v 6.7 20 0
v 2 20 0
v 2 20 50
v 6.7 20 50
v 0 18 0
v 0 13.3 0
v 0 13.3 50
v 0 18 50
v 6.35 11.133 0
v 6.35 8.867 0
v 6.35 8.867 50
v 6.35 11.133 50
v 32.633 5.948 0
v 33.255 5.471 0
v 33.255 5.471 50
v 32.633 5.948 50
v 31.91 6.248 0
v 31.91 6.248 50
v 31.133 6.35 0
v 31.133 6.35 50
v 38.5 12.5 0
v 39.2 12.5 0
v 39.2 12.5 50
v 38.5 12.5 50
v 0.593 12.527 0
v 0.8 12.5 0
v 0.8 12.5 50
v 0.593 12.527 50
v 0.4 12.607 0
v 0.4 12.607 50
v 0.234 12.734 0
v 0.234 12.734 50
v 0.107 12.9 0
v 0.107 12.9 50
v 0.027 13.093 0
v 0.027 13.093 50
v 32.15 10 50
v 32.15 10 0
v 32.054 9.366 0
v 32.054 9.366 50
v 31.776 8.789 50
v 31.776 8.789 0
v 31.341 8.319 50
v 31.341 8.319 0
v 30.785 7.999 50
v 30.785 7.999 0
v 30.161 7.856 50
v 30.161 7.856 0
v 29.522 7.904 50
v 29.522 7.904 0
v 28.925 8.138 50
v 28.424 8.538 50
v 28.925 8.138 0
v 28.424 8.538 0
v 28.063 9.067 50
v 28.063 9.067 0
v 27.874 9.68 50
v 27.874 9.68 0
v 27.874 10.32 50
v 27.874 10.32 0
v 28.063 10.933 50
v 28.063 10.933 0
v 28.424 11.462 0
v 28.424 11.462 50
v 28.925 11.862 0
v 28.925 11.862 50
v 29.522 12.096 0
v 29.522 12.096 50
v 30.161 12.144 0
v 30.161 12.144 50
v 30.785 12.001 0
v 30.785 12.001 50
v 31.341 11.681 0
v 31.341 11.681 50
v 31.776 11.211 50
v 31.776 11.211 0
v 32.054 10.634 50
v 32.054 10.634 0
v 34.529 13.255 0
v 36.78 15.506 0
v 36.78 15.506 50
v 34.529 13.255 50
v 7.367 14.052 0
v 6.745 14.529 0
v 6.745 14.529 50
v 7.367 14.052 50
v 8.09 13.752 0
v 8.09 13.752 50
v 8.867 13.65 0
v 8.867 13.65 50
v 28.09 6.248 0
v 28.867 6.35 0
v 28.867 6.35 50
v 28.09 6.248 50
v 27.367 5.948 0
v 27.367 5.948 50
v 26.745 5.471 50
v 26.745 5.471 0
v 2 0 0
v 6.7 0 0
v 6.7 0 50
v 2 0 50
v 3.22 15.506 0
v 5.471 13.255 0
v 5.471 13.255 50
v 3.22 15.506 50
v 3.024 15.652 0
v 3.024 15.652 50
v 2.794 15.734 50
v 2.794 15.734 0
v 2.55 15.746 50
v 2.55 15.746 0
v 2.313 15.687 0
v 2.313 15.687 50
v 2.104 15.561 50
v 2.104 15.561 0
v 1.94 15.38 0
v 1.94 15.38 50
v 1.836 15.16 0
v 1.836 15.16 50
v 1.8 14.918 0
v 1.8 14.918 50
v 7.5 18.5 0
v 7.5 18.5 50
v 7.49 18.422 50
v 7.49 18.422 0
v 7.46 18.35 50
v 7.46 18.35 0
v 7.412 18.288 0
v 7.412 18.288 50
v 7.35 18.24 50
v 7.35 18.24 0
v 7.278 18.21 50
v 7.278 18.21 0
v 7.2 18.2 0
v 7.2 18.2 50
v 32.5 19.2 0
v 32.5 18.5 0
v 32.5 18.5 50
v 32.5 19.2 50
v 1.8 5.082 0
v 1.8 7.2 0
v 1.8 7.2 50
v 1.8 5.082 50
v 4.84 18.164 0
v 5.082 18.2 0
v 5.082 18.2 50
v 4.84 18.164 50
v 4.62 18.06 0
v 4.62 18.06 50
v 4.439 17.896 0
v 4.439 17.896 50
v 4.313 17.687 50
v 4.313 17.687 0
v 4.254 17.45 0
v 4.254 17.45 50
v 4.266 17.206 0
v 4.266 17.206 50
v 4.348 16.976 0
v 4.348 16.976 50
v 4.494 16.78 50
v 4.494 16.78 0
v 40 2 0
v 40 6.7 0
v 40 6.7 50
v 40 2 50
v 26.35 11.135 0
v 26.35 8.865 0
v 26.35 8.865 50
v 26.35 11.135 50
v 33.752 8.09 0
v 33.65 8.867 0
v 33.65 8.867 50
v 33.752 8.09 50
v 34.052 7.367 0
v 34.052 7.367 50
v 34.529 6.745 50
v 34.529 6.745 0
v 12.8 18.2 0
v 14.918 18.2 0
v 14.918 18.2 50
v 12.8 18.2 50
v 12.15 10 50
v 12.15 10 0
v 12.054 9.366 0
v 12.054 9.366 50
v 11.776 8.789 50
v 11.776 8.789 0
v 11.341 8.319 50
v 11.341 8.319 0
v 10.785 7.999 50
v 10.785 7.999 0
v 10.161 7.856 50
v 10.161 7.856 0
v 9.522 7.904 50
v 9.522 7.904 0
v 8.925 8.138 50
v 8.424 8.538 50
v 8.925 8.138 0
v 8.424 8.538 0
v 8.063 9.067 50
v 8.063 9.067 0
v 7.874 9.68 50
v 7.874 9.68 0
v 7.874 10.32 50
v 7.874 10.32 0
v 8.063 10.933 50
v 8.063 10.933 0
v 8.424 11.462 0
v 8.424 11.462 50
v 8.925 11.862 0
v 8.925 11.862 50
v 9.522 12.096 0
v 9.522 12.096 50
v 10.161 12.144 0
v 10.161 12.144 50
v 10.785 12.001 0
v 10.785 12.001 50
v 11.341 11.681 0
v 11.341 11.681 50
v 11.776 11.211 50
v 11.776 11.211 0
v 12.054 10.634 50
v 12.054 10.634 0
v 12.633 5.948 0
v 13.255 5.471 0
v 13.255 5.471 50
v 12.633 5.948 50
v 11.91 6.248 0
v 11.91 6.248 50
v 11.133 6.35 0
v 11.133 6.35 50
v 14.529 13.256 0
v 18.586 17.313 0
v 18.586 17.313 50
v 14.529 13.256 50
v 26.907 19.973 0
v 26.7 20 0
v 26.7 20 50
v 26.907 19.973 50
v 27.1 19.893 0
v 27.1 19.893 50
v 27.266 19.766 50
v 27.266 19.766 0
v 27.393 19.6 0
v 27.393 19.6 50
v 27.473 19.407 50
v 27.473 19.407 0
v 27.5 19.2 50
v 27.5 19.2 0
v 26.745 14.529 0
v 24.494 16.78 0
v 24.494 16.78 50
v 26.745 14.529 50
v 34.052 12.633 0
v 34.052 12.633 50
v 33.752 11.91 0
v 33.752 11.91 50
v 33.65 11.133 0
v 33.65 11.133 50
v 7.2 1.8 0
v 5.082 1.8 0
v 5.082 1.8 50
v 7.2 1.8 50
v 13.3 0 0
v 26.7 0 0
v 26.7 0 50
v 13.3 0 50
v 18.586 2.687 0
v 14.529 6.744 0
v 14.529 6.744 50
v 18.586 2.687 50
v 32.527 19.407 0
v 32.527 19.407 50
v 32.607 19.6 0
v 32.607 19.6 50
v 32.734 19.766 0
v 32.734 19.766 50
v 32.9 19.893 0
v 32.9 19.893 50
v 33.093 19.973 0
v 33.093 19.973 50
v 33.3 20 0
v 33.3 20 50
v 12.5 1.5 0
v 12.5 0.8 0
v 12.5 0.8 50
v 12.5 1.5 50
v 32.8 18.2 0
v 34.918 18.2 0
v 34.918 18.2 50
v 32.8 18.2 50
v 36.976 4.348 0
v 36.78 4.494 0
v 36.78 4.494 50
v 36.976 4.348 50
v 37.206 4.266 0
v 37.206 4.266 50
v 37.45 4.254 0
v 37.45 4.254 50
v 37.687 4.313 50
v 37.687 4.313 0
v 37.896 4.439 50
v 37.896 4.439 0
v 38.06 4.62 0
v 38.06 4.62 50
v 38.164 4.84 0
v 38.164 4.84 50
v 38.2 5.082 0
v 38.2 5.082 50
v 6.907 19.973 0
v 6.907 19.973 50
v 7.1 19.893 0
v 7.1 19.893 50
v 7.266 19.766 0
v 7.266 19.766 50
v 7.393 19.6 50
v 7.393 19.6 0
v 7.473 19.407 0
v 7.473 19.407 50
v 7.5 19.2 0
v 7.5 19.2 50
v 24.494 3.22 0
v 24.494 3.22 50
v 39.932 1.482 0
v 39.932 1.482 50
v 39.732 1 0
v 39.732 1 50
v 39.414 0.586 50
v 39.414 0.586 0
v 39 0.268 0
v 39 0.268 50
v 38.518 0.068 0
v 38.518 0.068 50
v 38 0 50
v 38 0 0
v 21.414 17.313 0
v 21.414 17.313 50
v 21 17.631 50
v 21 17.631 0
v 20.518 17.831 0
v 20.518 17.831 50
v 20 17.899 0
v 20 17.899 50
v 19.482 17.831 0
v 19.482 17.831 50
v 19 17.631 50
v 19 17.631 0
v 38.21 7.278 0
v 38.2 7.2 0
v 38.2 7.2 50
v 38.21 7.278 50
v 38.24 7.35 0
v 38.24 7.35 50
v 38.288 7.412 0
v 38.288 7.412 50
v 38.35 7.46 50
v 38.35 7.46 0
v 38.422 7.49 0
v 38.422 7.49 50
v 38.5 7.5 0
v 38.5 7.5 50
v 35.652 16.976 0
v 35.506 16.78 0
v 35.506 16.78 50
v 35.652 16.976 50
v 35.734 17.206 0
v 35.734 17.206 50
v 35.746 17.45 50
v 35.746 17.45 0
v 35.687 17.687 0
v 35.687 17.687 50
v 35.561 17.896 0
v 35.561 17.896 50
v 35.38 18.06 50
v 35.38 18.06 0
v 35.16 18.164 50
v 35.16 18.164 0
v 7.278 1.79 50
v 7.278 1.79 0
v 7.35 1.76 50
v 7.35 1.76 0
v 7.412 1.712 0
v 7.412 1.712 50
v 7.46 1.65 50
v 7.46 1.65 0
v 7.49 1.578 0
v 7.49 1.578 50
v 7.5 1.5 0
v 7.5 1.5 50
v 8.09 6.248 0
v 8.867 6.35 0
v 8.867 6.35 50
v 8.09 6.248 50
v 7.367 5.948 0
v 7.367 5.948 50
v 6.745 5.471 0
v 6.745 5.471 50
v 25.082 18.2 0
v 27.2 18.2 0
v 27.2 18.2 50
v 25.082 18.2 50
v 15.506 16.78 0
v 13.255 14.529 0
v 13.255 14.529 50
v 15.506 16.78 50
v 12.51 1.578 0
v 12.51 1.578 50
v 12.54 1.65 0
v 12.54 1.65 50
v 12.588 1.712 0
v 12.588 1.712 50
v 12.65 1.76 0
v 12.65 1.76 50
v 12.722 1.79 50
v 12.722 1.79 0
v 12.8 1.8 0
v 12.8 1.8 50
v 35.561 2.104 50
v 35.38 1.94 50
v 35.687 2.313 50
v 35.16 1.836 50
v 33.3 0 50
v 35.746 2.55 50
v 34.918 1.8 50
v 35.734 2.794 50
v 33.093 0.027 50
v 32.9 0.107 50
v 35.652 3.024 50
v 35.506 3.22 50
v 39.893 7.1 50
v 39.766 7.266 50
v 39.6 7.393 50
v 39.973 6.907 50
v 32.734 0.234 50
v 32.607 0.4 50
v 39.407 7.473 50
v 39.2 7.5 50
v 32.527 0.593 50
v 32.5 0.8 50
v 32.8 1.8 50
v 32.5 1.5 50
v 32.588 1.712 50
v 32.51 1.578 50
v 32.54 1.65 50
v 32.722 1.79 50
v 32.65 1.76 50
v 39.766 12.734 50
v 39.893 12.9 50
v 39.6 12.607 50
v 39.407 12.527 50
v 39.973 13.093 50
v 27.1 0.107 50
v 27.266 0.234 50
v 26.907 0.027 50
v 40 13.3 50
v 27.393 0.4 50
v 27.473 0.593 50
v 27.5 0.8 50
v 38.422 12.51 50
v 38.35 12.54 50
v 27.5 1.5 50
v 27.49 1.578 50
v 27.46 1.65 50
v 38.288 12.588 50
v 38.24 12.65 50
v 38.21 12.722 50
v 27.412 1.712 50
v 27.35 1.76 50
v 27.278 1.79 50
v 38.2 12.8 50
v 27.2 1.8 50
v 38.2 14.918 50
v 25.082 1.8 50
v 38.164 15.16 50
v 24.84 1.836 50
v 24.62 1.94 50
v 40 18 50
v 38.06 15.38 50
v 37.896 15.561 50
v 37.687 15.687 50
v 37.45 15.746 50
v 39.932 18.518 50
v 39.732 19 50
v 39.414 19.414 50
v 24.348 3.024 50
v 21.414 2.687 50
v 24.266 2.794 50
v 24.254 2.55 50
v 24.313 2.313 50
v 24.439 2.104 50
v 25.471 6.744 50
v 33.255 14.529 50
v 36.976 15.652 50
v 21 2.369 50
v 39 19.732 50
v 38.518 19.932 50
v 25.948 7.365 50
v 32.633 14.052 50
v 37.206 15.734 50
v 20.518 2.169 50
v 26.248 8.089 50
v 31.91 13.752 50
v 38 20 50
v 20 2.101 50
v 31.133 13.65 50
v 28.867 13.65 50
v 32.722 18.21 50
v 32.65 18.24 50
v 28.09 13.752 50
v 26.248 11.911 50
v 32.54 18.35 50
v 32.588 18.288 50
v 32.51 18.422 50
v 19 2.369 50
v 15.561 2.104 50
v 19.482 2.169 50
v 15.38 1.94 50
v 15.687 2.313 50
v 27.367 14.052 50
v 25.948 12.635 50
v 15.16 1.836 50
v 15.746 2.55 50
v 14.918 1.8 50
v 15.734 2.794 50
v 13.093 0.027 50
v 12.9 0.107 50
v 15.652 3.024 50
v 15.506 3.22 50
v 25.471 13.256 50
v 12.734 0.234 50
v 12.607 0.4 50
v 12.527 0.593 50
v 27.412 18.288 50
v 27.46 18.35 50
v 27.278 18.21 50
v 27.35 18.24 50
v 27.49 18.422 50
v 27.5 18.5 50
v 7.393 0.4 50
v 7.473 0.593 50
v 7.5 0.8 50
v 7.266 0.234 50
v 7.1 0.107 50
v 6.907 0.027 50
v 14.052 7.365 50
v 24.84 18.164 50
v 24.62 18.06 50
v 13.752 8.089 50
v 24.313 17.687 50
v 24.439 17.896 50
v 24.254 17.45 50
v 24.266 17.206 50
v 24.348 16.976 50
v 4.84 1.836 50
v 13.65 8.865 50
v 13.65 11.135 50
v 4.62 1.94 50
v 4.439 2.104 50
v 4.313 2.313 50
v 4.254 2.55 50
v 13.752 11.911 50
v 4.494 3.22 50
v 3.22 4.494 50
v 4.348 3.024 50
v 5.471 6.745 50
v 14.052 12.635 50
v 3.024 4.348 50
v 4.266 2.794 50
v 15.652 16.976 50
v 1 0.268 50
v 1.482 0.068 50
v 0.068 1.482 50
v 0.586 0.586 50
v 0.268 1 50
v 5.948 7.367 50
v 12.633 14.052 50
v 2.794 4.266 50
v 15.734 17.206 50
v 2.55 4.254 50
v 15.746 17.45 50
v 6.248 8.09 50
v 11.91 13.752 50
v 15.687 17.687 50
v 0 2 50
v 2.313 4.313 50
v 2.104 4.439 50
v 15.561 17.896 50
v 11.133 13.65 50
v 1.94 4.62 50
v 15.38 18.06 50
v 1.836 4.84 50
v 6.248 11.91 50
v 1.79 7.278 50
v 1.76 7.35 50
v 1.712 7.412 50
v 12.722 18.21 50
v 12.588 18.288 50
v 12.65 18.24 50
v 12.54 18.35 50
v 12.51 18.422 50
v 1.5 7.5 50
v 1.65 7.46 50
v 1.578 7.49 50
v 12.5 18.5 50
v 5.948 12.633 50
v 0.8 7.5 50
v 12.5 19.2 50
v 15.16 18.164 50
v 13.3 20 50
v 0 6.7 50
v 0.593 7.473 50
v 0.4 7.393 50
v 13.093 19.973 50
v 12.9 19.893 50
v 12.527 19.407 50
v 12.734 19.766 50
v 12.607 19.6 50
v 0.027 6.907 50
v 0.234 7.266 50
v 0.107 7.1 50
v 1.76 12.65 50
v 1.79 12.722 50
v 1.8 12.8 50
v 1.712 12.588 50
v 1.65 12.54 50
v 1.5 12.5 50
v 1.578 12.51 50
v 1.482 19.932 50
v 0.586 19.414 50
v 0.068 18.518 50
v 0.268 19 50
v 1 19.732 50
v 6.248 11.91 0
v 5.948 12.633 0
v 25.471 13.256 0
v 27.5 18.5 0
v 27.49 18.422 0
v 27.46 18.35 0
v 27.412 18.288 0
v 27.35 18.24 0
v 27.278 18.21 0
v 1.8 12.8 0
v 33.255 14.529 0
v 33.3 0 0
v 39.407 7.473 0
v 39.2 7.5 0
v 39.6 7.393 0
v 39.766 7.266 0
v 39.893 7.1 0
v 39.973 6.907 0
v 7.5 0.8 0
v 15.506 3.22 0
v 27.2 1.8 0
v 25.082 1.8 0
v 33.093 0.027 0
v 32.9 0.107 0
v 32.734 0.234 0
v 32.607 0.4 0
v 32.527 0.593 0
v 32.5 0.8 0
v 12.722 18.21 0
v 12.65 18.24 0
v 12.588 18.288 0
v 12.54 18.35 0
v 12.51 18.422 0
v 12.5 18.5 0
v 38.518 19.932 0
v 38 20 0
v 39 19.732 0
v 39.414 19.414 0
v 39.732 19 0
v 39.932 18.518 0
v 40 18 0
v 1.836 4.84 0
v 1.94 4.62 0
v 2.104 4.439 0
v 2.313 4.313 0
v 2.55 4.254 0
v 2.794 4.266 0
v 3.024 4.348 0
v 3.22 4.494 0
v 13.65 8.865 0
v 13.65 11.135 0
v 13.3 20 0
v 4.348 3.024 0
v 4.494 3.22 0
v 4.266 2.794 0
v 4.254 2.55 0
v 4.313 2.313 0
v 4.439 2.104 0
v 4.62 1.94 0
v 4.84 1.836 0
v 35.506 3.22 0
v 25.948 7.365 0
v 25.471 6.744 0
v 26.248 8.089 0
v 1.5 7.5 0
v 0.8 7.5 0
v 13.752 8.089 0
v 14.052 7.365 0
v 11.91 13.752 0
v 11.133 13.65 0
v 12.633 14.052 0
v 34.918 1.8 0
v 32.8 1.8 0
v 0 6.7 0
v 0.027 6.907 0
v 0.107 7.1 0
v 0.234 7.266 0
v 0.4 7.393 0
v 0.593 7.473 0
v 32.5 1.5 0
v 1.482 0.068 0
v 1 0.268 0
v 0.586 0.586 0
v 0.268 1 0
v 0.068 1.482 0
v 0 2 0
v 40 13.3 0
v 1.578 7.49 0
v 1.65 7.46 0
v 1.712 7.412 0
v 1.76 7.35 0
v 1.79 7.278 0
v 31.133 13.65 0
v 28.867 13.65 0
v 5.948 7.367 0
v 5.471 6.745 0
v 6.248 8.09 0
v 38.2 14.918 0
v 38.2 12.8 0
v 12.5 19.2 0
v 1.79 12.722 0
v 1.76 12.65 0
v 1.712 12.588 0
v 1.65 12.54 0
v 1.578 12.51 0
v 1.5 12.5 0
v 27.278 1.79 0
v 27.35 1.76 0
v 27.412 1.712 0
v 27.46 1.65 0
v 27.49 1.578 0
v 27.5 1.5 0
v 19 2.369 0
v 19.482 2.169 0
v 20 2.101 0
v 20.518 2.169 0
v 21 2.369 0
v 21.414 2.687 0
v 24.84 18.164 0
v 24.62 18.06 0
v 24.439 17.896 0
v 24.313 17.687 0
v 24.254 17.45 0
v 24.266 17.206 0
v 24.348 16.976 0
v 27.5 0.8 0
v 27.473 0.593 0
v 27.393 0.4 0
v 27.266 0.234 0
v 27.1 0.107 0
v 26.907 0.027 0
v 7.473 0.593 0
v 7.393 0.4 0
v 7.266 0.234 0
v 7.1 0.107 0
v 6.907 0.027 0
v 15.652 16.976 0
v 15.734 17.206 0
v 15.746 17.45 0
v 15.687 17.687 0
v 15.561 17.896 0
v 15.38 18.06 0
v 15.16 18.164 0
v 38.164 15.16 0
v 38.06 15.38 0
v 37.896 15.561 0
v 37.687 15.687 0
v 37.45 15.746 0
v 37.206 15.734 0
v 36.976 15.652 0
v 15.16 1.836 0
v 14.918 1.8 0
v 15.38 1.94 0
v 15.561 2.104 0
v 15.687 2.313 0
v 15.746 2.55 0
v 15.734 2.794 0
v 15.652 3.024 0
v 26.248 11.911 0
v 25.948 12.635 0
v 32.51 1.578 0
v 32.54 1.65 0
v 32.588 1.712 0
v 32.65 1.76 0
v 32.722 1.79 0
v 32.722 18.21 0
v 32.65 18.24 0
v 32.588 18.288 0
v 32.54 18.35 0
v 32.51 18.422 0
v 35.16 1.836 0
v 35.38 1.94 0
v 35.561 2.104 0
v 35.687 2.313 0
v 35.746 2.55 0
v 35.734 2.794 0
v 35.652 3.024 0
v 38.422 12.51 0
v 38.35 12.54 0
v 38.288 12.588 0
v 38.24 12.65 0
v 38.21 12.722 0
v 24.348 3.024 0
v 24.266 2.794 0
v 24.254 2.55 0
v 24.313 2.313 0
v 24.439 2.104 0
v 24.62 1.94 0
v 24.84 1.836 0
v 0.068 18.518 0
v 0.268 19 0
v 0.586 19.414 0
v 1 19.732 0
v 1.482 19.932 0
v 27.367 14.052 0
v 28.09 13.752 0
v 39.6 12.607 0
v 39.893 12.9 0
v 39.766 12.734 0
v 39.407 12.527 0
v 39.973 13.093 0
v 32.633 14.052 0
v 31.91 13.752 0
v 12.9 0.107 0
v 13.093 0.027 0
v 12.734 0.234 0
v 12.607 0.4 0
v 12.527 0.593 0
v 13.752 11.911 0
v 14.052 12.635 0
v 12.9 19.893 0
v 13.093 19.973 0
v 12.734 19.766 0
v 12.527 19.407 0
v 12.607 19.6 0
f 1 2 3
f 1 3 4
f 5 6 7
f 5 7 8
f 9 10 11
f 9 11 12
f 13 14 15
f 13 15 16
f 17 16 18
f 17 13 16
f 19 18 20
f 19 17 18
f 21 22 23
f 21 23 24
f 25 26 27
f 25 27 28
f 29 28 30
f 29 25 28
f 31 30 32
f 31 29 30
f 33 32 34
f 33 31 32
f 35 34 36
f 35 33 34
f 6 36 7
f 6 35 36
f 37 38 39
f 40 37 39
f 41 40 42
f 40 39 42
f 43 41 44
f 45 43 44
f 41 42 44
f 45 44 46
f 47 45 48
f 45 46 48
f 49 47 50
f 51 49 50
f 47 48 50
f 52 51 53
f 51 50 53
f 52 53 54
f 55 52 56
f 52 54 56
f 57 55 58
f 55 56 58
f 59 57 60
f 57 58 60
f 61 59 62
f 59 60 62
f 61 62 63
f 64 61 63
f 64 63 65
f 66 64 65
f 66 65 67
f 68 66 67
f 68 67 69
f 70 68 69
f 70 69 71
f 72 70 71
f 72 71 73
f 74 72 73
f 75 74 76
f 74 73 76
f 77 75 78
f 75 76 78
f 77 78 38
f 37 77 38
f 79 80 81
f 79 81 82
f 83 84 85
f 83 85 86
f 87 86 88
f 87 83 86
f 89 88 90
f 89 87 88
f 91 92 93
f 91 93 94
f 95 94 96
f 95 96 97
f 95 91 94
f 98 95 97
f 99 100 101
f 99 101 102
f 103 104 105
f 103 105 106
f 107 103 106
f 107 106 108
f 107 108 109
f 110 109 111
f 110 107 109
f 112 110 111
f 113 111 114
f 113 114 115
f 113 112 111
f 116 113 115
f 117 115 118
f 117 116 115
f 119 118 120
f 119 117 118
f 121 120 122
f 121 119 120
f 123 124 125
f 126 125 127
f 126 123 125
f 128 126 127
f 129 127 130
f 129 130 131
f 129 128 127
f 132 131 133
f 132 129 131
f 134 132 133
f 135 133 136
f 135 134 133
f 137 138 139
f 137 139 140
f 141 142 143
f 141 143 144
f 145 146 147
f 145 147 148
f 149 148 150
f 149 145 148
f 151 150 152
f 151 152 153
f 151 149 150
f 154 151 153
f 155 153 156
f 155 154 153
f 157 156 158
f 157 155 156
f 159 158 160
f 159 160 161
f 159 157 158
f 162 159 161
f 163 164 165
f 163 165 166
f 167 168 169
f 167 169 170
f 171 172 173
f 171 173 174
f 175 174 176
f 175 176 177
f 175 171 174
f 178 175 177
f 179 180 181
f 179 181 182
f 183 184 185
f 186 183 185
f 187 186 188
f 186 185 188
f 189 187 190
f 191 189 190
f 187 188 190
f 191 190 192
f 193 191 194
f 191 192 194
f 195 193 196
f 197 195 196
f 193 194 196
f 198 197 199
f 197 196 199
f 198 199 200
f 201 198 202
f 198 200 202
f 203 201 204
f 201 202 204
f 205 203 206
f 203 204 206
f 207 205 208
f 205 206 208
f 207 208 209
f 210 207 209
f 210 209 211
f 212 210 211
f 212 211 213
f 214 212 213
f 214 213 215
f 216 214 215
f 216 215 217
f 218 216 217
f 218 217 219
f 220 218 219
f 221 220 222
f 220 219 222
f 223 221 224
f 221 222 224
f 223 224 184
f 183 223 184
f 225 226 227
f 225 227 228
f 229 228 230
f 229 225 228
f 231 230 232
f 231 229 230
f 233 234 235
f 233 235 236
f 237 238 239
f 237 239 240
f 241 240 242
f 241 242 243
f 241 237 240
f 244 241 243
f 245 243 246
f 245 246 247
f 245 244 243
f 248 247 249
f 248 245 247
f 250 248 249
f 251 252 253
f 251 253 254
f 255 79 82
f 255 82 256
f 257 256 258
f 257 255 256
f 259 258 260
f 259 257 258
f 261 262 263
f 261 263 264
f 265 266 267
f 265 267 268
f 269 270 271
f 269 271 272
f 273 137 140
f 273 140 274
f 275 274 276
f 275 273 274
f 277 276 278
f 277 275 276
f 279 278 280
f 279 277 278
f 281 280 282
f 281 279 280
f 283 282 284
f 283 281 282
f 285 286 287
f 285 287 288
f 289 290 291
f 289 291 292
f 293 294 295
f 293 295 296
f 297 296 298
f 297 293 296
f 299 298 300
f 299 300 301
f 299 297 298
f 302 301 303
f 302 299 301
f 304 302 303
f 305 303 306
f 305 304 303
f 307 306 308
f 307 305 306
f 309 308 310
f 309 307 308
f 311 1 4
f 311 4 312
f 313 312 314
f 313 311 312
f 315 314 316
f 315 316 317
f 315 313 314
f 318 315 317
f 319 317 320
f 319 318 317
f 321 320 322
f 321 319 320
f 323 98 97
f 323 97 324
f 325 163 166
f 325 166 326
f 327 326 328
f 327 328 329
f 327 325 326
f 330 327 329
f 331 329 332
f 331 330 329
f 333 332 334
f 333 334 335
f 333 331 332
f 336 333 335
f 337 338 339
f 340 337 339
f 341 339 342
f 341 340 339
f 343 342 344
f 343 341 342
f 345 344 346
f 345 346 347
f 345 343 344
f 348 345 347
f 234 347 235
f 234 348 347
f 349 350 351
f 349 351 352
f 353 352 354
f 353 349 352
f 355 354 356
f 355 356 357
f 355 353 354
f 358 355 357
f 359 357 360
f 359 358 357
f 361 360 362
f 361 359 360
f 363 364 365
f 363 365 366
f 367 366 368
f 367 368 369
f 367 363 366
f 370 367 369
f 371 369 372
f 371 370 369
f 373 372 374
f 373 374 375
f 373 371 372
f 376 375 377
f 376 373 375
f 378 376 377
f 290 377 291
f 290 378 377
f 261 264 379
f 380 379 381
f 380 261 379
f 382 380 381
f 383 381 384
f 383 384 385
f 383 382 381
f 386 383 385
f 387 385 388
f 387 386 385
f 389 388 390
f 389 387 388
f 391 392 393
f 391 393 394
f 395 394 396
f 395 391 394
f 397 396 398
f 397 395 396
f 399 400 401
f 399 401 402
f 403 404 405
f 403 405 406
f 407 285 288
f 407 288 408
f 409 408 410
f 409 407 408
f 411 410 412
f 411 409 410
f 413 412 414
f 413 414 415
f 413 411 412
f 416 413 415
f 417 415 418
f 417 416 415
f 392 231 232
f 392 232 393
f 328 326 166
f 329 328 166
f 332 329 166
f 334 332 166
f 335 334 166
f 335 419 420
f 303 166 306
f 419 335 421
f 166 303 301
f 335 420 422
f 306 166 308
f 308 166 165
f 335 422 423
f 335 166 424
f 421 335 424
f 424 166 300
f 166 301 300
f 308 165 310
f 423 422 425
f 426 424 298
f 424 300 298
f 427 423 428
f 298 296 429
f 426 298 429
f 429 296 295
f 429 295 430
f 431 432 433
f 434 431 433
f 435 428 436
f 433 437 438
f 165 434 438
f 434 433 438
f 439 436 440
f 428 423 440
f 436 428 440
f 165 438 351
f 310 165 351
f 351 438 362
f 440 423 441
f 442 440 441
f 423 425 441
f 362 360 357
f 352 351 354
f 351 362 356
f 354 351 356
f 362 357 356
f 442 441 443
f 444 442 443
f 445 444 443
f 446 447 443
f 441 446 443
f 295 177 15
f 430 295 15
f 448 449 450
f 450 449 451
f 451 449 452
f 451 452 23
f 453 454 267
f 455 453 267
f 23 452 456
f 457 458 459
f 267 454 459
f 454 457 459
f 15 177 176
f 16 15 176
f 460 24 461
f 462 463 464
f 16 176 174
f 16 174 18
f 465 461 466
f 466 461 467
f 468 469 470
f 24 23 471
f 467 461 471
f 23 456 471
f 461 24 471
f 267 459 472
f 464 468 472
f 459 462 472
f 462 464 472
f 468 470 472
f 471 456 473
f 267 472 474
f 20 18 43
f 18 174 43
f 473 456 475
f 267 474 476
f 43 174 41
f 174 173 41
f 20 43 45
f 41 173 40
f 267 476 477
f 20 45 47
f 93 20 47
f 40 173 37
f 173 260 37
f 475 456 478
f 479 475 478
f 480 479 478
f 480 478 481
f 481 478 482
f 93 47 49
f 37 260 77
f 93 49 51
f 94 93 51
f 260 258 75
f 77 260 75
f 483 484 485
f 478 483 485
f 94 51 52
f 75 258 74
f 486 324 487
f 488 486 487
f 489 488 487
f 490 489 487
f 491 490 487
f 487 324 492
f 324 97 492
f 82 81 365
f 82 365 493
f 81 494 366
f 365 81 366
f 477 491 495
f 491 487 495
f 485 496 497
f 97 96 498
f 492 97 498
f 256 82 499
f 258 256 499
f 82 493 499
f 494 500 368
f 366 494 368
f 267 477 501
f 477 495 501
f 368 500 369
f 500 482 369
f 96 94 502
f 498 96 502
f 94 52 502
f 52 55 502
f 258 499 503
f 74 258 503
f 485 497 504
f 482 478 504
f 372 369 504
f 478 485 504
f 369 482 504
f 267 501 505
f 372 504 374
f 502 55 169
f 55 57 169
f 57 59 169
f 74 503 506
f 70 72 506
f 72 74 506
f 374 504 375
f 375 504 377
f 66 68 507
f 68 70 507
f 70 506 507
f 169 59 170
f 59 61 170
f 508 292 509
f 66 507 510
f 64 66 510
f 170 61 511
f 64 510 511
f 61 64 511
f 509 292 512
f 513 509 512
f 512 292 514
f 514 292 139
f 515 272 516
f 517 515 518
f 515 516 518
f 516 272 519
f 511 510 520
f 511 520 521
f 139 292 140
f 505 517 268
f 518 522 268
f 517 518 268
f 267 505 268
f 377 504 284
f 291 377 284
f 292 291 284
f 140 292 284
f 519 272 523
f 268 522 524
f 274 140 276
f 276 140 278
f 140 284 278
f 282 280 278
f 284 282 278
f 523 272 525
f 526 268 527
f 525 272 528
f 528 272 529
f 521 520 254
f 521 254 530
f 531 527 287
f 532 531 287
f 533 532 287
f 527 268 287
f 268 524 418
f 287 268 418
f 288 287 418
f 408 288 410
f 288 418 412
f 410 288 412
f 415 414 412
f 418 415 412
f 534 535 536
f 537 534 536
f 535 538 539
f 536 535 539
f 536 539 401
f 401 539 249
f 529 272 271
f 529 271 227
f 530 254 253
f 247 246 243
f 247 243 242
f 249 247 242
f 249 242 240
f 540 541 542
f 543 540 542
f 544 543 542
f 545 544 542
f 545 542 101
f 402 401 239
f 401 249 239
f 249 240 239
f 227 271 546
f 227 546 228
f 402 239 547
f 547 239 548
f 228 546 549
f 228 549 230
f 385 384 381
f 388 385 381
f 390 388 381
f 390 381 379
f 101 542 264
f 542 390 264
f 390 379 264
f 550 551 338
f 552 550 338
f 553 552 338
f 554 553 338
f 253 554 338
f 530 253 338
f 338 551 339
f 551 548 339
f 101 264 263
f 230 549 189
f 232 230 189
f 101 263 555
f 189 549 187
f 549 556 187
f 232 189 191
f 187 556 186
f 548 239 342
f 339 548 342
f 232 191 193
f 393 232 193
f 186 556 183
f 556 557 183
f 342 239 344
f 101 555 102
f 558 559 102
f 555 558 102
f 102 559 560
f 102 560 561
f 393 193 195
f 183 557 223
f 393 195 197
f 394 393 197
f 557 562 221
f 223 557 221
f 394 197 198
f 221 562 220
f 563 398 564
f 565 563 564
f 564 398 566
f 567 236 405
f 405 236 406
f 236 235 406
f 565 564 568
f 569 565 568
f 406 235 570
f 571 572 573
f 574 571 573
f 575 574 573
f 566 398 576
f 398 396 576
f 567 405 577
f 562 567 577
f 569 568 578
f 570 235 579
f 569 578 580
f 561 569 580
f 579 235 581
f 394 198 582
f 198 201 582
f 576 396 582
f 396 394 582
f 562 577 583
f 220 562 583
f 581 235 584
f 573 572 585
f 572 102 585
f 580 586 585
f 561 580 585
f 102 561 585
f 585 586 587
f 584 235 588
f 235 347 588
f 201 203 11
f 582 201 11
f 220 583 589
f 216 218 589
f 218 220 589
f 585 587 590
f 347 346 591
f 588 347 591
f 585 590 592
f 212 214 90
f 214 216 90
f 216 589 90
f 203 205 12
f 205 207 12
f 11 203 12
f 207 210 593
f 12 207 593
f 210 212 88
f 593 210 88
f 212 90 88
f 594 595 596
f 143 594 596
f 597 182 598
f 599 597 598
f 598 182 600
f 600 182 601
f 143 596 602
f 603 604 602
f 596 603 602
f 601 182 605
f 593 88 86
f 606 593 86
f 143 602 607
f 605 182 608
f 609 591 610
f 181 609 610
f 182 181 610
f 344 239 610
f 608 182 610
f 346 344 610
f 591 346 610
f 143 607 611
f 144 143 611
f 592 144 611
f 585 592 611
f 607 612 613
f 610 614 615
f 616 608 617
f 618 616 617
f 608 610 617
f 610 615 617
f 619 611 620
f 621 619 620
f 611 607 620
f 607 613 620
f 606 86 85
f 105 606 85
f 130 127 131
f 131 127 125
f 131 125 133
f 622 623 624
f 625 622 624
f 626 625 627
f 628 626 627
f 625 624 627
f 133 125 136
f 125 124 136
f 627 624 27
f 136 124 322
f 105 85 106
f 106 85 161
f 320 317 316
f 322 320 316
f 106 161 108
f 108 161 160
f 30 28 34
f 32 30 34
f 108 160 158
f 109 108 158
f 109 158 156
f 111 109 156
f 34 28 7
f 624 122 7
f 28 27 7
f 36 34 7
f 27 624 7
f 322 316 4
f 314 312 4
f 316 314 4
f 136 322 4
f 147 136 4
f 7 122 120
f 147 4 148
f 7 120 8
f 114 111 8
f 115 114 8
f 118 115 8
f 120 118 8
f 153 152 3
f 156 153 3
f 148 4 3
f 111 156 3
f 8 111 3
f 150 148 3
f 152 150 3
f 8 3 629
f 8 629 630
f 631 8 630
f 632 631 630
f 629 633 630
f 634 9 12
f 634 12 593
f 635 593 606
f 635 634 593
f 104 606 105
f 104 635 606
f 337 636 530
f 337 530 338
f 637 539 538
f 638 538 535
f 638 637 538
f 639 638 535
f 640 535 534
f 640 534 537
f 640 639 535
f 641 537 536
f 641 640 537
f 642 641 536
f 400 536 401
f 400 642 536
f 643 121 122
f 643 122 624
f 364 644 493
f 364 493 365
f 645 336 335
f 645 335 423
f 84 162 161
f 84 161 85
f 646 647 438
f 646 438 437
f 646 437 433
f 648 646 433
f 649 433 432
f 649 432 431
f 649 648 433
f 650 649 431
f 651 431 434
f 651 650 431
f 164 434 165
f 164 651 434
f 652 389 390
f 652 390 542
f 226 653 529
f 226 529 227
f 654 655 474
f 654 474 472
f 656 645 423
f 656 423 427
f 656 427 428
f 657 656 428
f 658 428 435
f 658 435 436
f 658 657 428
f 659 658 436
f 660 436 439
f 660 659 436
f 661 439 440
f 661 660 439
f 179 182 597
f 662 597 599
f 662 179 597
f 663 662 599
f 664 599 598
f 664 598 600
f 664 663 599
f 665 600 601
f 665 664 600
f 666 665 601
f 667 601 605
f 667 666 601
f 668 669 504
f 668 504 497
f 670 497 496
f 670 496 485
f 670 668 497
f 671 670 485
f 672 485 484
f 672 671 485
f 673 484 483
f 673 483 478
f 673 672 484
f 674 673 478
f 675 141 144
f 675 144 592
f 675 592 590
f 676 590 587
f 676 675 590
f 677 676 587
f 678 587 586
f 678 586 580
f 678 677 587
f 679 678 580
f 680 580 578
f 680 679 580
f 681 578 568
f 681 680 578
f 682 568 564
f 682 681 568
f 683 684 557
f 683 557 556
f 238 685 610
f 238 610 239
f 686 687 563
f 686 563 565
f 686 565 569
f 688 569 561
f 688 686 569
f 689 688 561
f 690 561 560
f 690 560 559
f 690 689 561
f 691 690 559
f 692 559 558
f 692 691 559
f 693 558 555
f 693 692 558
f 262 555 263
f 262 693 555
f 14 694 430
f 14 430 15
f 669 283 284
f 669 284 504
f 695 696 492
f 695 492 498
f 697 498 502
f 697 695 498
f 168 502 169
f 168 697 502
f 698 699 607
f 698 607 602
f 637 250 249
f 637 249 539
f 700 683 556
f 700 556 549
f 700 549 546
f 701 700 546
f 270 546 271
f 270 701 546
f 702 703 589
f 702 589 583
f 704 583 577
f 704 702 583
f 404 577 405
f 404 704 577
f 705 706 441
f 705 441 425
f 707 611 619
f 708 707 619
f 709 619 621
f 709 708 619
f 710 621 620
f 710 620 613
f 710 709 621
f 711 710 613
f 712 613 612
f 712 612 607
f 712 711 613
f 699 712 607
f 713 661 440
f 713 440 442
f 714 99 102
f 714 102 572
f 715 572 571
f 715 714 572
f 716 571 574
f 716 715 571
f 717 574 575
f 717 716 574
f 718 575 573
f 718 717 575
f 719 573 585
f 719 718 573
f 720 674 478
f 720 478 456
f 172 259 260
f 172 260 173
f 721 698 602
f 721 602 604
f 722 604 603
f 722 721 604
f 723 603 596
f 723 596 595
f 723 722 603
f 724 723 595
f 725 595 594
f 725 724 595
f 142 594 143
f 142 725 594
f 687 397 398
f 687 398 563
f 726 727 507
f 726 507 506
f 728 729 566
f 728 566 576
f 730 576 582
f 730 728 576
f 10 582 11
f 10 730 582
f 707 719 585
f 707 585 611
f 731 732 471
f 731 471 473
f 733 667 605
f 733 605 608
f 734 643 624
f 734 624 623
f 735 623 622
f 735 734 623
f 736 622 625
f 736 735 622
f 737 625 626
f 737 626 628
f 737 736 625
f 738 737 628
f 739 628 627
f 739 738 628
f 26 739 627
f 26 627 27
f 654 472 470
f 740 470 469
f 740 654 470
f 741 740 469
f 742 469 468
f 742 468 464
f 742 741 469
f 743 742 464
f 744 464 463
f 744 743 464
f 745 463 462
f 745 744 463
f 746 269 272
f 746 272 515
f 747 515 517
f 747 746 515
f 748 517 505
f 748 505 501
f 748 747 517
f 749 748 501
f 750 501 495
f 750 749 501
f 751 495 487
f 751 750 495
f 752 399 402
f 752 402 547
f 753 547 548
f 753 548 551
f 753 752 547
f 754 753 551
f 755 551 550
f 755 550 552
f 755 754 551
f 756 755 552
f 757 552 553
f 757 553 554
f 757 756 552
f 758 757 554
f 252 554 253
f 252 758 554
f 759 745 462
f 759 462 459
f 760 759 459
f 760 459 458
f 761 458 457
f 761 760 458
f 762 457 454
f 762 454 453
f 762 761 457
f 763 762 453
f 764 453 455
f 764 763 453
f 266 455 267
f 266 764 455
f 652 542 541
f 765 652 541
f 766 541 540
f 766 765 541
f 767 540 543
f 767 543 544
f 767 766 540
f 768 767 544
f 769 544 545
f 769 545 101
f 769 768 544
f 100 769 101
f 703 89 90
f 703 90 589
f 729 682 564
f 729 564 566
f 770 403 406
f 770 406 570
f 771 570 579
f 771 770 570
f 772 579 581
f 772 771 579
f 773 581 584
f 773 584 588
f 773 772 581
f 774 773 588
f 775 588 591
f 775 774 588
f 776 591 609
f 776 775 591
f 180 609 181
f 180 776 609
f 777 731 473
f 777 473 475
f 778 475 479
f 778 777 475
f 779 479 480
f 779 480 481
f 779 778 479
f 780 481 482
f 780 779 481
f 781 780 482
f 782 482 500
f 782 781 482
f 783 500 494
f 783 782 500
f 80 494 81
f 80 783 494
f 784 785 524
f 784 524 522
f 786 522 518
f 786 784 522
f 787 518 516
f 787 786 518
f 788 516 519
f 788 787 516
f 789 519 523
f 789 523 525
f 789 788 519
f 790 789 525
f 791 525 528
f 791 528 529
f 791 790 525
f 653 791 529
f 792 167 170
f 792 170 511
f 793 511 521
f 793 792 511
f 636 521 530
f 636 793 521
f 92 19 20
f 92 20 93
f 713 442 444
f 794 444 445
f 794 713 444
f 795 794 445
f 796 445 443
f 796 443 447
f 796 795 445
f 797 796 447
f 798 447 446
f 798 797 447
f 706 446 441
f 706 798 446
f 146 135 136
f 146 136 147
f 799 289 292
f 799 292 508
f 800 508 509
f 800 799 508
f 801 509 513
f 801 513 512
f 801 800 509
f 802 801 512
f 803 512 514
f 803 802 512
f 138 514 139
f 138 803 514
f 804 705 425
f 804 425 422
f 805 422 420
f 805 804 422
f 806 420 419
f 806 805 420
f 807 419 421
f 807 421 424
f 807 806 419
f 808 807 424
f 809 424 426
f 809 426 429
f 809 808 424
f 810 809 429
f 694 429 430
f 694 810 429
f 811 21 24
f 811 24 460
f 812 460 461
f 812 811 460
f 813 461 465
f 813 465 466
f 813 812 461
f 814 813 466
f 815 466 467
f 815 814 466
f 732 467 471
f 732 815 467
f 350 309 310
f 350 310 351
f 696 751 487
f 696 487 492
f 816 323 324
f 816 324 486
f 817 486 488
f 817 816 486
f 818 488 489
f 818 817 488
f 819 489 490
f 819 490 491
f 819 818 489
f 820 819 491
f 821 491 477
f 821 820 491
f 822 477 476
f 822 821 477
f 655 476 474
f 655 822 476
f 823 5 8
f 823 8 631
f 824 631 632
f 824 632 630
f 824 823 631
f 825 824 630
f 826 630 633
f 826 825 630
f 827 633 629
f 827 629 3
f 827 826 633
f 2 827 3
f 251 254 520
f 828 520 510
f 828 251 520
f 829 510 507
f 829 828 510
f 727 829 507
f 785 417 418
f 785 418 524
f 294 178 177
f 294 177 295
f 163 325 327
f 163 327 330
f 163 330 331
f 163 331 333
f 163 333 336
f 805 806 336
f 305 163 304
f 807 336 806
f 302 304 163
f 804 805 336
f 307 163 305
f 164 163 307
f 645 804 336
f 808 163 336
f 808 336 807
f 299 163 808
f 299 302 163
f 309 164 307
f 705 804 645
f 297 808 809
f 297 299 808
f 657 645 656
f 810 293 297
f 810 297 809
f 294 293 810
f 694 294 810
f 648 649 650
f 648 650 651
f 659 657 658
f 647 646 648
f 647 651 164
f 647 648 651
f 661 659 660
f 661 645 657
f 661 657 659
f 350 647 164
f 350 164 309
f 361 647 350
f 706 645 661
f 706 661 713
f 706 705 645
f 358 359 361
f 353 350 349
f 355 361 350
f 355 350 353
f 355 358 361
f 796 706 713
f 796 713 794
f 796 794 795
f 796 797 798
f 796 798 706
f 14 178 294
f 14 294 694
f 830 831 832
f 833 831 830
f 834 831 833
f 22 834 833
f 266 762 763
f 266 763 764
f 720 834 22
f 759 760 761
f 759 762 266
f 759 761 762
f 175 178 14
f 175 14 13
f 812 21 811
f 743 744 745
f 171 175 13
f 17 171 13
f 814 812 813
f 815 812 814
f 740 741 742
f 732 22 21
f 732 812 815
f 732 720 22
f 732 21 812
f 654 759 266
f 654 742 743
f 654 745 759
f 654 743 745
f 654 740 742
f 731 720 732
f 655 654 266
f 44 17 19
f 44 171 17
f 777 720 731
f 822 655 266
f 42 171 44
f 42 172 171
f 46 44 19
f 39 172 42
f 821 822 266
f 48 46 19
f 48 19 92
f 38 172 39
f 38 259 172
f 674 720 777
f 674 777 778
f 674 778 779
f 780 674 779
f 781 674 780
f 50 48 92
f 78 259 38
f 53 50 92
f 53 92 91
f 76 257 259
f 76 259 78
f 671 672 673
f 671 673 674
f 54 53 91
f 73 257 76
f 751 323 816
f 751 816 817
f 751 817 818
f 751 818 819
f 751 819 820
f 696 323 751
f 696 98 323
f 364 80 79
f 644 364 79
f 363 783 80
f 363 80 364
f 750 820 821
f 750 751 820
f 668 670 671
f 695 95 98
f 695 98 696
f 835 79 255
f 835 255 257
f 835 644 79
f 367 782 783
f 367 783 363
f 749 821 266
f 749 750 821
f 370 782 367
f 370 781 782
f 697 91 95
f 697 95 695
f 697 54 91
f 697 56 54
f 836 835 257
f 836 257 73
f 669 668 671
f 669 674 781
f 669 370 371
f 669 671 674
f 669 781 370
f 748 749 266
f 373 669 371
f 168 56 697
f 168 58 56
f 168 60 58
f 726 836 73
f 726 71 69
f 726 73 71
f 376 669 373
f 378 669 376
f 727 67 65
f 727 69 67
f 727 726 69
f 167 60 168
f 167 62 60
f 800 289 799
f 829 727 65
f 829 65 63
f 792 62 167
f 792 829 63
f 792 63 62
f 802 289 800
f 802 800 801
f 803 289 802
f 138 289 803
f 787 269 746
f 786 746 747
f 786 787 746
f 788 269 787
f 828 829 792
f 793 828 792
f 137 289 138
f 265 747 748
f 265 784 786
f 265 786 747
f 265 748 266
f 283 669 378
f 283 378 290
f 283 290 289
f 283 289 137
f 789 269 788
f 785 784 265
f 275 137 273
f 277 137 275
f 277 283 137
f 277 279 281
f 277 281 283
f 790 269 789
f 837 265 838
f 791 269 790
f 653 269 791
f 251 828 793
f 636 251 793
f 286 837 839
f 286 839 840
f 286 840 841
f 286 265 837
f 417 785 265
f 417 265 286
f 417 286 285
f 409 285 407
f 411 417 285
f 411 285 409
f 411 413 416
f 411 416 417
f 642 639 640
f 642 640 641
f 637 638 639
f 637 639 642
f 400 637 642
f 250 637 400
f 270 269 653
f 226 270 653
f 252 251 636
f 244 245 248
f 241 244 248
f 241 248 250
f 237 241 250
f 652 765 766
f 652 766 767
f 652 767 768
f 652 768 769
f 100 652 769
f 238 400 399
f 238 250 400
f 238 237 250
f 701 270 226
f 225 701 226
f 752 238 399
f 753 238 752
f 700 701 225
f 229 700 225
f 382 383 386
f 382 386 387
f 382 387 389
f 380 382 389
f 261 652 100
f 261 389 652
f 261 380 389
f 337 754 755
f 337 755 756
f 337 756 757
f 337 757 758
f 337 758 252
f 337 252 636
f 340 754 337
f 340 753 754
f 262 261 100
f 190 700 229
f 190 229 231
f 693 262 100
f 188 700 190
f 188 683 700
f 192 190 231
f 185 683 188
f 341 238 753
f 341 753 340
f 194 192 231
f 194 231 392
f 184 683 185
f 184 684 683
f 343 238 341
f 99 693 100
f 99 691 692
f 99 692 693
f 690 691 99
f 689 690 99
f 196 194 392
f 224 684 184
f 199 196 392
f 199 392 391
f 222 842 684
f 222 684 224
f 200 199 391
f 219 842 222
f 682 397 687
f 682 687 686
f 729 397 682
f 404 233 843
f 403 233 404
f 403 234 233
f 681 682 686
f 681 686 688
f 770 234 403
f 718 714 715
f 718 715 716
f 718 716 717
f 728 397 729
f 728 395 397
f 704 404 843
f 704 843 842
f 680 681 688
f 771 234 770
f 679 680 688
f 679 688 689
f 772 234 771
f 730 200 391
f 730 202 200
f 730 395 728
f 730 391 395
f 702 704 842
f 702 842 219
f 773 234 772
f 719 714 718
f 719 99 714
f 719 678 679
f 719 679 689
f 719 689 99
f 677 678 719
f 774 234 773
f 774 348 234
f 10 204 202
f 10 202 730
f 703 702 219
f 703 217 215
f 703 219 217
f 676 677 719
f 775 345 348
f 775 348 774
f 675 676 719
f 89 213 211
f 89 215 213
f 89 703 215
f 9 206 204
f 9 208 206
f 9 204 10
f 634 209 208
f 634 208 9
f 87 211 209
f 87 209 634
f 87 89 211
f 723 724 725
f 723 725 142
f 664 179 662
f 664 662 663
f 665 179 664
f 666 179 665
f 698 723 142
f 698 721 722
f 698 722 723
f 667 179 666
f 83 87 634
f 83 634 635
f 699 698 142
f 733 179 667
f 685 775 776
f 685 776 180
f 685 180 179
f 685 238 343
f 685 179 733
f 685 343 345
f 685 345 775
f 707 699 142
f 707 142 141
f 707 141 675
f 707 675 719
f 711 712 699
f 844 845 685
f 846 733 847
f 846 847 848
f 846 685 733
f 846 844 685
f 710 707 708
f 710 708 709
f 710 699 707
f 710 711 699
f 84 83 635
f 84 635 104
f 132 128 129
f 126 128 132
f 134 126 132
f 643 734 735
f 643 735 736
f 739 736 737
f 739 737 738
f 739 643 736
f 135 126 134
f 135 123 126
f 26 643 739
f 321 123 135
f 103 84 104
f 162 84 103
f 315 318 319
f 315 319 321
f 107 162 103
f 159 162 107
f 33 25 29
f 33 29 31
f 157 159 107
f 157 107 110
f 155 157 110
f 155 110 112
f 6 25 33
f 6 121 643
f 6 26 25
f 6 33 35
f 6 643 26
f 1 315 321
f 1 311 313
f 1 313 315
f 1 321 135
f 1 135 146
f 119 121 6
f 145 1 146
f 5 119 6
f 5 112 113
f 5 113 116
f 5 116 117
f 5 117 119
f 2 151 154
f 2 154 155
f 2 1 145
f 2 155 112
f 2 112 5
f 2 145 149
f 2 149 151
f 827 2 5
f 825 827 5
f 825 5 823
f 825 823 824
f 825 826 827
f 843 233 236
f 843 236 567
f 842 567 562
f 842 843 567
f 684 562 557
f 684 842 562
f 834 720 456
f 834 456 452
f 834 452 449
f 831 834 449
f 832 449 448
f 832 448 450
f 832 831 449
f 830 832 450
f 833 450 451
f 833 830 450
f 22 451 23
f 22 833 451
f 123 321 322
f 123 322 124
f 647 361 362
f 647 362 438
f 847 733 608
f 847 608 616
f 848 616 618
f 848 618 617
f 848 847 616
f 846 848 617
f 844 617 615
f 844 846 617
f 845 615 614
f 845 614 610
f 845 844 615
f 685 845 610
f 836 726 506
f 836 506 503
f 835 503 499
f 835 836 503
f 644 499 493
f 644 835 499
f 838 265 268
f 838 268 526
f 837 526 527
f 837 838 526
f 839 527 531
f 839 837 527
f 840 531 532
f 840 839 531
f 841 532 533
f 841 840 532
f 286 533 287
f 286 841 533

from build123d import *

# Parameters (mm, degrees)
ESQUISSE1_R        = 2.15
BOSS_EXTRU_1_DEPTH = 50


with BuildPart() as part:
    # Esquisse1 → Boss.-Extru.1 (new body)
    with BuildSketch(Plane(origin=(0, 0, 0), x_dir=(-1, 0, 0), z_dir=(0, 0, -1))):
        with BuildLine():
            Line((-40, 6.7), (-40, 2))
            ThreePointArc((-40, 2), (-39.414213562, 0.585786438), (-38, 0))
            Line((-38, 0), (-33.3, 0))
            ThreePointArc((-33.3, 0), (-32.734314575, 0.234314575), (-32.5, 0.8))
            Line((-32.5, 0.8), (-32.5, 1.5))
            ThreePointArc((-32.5, 1.5), (-32.587867966, 1.712132034), (-32.8, 1.8))
            Line((-32.8, 1.8), (-34.918424061, 1.8))
            ThreePointArc((-34.918424061, 1.8), (-35.686700051, 2.313345604), (-35.506437047, 3.219588924))
            Line((-35.506437047, 3.219588924), (-33.254705627, 5.471320344))
            ThreePointArc((-33.254705627, 5.471320344), (-32.281435581, 6.121638598), (-31.133385284, 6.35))
            Line((-31.133385284, 6.35), (-28.866614716, 6.35))
            ThreePointArc((-28.866614716, 6.35), (-27.718564419, 6.121638598), (-26.745294373, 5.471320344))
            Line((-26.745294373, 5.471320344), (-24.493562953, 3.219588924))
            ThreePointArc((-24.493562953, 3.219588924), (-24.313299949, 2.313345604), (-25.081575939, 1.8))
            Line((-25.081575939, 1.8), (-27.2, 1.8))
            ThreePointArc((-27.2, 1.8), (-27.412132034, 1.712132034), (-27.5, 1.5))
            Line((-27.5, 1.5), (-27.5, 0.8))
            ThreePointArc((-27.5, 0.8), (-27.265685425, 0.234314575), (-26.7, 0))
            Line((-26.7, 0), (-13.3, 0))
            ThreePointArc((-13.3, 0), (-12.734314575, 0.234314575), (-12.5, 0.8))
            Line((-12.5, 0.8), (-12.5, 1.5))
            ThreePointArc((-12.5, 1.5), (-12.587867966, 1.712132034), (-12.8, 1.8))
            Line((-12.8, 1.8), (-14.918424061, 1.8))
            ThreePointArc((-14.918424061, 1.8), (-15.686700051, 2.313345604), (-15.506437047, 3.219588924))
            Line((-15.506437047, 3.219588924), (-13.254705627, 5.471320344))
            ThreePointArc((-13.254705627, 5.471320344), (-12.281435581, 6.121638598), (-11.133385284, 6.35))
            Line((-11.133385284, 6.35), (-8.866614716, 6.35))
            ThreePointArc((-8.866614716, 6.35), (-7.718564419, 6.121638598), (-6.745294373, 5.471320344))
            Line((-6.745294373, 5.471320344), (-4.493562953, 3.219588924))
            ThreePointArc((-4.493562953, 3.219588924), (-4.313299949, 2.313345604), (-5.081575939, 1.8))
            Line((-5.081575939, 1.8), (-7.2, 1.8))
            ThreePointArc((-7.2, 1.8), (-7.412132034, 1.712132034), (-7.5, 1.5))
            Line((-7.5, 1.5), (-7.5, 0.8))
            ThreePointArc((-7.5, 0.8), (-7.265685425, 0.234314575), (-6.7, 0))
            Line((-6.7, 0), (-2, 0))
            ThreePointArc((-2, 0), (-0.585786438, 0.585786438), (0, 2))
            Line((0, 2), (0, 6.7))
            ThreePointArc((0, 6.7), (-0.234314575, 7.265685425), (-0.8, 7.5))
            Line((-0.8, 7.5), (-1.5, 7.5))
            ThreePointArc((-1.5, 7.5), (-1.712132034, 7.412132034), (-1.8, 7.2))
            Line((-1.8, 7.2), (-1.8, 5.081575939))
            ThreePointArc((-1.8, 5.081575939), (-2.313345604, 4.313299949), (-3.219588924, 4.493562953))
            Line((-3.219588924, 4.493562953), (-5.471320344, 6.745294373))
            ThreePointArc((-5.471320344, 6.745294373), (-6.121638598, 7.718564419), (-6.35, 8.866614716))
            Line((-6.35, 8.866614716), (-6.35, 11.133385284))
            ThreePointArc((-6.35, 11.133385284), (-6.121638598, 12.281435581), (-5.471320344, 13.254705627))
            Line((-5.471320344, 13.254705627), (-3.219588924, 15.506437047))
            ThreePointArc((-3.219588924, 15.506437047), (-2.313345604, 15.686700051), (-1.8, 14.918424061))
            Line((-1.8, 14.918424061), (-1.8, 12.8))
            ThreePointArc((-1.8, 12.8), (-1.712132034, 12.587867966), (-1.5, 12.5))
            Line((-1.5, 12.5), (-0.8, 12.5))
            ThreePointArc((-0.8, 12.5), (-0.234314575, 12.734314575), (0, 13.3))
            Line((0, 13.3), (0, 18))
            ThreePointArc((0, 18), (-0.585786438, 19.414213562), (-2, 20))
            Line((-2, 20), (-6.7, 20))
            ThreePointArc((-6.7, 20), (-7.265685425, 19.765685425), (-7.5, 19.2))
            Line((-7.5, 19.2), (-7.5, 18.5))
            ThreePointArc((-7.5, 18.5), (-7.412132034, 18.287867966), (-7.2, 18.2))
            Line((-7.2, 18.2), (-5.081575939, 18.2))
            ThreePointArc((-5.081575939, 18.2), (-4.313299949, 17.686654396), (-4.493562953, 16.780411076))
            Line((-4.493562953, 16.780411076), (-6.745294373, 14.528679656))
            ThreePointArc((-6.745294373, 14.528679656), (-7.718564419, 13.878361402), (-8.866614716, 13.65))
            Line((-8.866614716, 13.65), (-11.133385284, 13.65))
            ThreePointArc((-11.133385284, 13.65), (-12.281435581, 13.878361402), (-13.254705627, 14.528679656))
            Line((-13.254705627, 14.528679656), (-15.506437047, 16.780411076))
            ThreePointArc((-15.506437047, 16.780411076), (-15.686700051, 17.686654396), (-14.918424061, 18.2))
            Line((-14.918424061, 18.2), (-12.8, 18.2))
            ThreePointArc((-12.8, 18.2), (-12.587867966, 18.287867966), (-12.5, 18.5))
            Line((-12.5, 18.5), (-12.5, 19.2))
            ThreePointArc((-12.5, 19.2), (-12.734314575, 19.765685425), (-13.3, 20))
            Line((-13.3, 20), (-26.7, 20))
            ThreePointArc((-26.7, 20), (-27.265685425, 19.765685425), (-27.5, 19.2))
            Line((-27.5, 19.2), (-27.5, 18.5))
            ThreePointArc((-27.5, 18.5), (-27.412132034, 18.287867966), (-27.2, 18.2))
            Line((-27.2, 18.2), (-25.081575939, 18.2))
            ThreePointArc((-25.081575939, 18.2), (-24.313299949, 17.686654396), (-24.493562953, 16.780411076))
            Line((-24.493562953, 16.780411076), (-26.745294373, 14.528679656))
            ThreePointArc((-26.745294373, 14.528679656), (-27.718564419, 13.878361402), (-28.866614716, 13.65))
            Line((-28.866614716, 13.65), (-31.133385284, 13.65))
            ThreePointArc((-31.133385284, 13.65), (-32.281435581, 13.878361402), (-33.254705627, 14.528679656))
            Line((-33.254705627, 14.528679656), (-35.506437047, 16.780411076))
            ThreePointArc((-35.506437047, 16.780411076), (-35.686700051, 17.686654396), (-34.918424061, 18.2))
            Line((-34.918424061, 18.2), (-32.8, 18.2))
            ThreePointArc((-32.8, 18.2), (-32.587867966, 18.287867966), (-32.5, 18.5))
            Line((-32.5, 18.5), (-32.5, 19.2))
            ThreePointArc((-32.5, 19.2), (-32.734314575, 19.765685425), (-33.3, 20))
            Line((-33.3, 20), (-38, 20))
            ThreePointArc((-38, 20), (-39.414213562, 19.414213562), (-40, 18))
            Line((-40, 18), (-40, 13.3))
            ThreePointArc((-40, 13.3), (-39.765685425, 12.734314575), (-39.2, 12.5))
            Line((-39.2, 12.5), (-38.5, 12.5))
            ThreePointArc((-38.5, 12.5), (-38.287867966, 12.587867966), (-38.2, 12.8))
            Line((-38.2, 12.8), (-38.2, 14.918424061))
            ThreePointArc((-38.2, 14.918424061), (-37.686654396, 15.686700051), (-36.780411076, 15.506437047))
            Line((-36.780411076, 15.506437047), (-34.528679656, 13.254705627))
            ThreePointArc((-34.528679656, 13.254705627), (-33.878361402, 12.281435581), (-33.65, 11.133385284))
            Line((-33.65, 11.133385284), (-33.65, 8.866614716))
            ThreePointArc((-33.65, 8.866614716), (-33.878361402, 7.718564419), (-34.528679656, 6.745294373))
            Line((-34.528679656, 6.745294373), (-36.780411076, 4.493562953))
            ThreePointArc((-36.780411076, 4.493562953), (-37.686654396, 4.313299949), (-38.2, 5.081575939))
            Line((-38.2, 5.081575939), (-38.2, 7.2))
            ThreePointArc((-38.2, 7.2), (-38.287867966, 7.412132034), (-38.5, 7.5))
            Line((-38.5, 7.5), (-39.2, 7.5))
            ThreePointArc((-39.2, 7.5), (-39.765685425, 7.265685425), (-40, 6.7))
        make_face()
        with Locations(Location((-10, 10, 0), (0, 0, 180))):
            Circle(ESQUISSE1_R, mode=Mode.SUBTRACT)
        with Locations(Location((-30, 10, 0), (0, 0, 180))):
            Circle(ESQUISSE1_R, mode=Mode.SUBTRACT)
        with BuildLine():
            Line((-18.585786174, 17.312993861), (-14.528681072, 13.255889759))
            ThreePointArc((-14.528681072, 13.255889759), (-13.878362627, 12.282619622), (-13.650001154, 11.134569154))
            Line((-13.650001154, 11.134569154), (-13.650001154, 8.865431094))
            ThreePointArc((-13.650001154, 8.865431094), (-13.878362476, 7.717381202), (-14.5286805, 6.7441115))
            Line((-14.5286805, 6.7441115), (-18.585786, 2.687006))
            ThreePointArc((-18.585786, 2.687006), (-19.999999562, 2.101219562), (-21.414213125, 2.687006))
            Line((-21.414213125, 2.687006), (-25.471320125, 6.744113))
            ThreePointArc((-25.471320125, 6.744113), (-26.121638379, 7.717383046), (-26.349999781, 8.865433344))
            Line((-26.349999781, 8.865433344), (-26.349999781, 11.134567344))
            ThreePointArc((-26.349999781, 11.134567344), (-26.121638308, 12.282617811), (-25.471319863, 13.255887949))
            Line((-25.471319863, 13.255887949), (-21.41421295, 17.312993861))
            ThreePointArc((-21.41421295, 17.312993861), (-19.999999562, 17.898780125), (-18.585786174, 17.312993861))
        make_face(mode=Mode.SUBTRACT)
    extrude(amount=-BOSS_EXTRU_1_DEPTH)


solid = part.part
